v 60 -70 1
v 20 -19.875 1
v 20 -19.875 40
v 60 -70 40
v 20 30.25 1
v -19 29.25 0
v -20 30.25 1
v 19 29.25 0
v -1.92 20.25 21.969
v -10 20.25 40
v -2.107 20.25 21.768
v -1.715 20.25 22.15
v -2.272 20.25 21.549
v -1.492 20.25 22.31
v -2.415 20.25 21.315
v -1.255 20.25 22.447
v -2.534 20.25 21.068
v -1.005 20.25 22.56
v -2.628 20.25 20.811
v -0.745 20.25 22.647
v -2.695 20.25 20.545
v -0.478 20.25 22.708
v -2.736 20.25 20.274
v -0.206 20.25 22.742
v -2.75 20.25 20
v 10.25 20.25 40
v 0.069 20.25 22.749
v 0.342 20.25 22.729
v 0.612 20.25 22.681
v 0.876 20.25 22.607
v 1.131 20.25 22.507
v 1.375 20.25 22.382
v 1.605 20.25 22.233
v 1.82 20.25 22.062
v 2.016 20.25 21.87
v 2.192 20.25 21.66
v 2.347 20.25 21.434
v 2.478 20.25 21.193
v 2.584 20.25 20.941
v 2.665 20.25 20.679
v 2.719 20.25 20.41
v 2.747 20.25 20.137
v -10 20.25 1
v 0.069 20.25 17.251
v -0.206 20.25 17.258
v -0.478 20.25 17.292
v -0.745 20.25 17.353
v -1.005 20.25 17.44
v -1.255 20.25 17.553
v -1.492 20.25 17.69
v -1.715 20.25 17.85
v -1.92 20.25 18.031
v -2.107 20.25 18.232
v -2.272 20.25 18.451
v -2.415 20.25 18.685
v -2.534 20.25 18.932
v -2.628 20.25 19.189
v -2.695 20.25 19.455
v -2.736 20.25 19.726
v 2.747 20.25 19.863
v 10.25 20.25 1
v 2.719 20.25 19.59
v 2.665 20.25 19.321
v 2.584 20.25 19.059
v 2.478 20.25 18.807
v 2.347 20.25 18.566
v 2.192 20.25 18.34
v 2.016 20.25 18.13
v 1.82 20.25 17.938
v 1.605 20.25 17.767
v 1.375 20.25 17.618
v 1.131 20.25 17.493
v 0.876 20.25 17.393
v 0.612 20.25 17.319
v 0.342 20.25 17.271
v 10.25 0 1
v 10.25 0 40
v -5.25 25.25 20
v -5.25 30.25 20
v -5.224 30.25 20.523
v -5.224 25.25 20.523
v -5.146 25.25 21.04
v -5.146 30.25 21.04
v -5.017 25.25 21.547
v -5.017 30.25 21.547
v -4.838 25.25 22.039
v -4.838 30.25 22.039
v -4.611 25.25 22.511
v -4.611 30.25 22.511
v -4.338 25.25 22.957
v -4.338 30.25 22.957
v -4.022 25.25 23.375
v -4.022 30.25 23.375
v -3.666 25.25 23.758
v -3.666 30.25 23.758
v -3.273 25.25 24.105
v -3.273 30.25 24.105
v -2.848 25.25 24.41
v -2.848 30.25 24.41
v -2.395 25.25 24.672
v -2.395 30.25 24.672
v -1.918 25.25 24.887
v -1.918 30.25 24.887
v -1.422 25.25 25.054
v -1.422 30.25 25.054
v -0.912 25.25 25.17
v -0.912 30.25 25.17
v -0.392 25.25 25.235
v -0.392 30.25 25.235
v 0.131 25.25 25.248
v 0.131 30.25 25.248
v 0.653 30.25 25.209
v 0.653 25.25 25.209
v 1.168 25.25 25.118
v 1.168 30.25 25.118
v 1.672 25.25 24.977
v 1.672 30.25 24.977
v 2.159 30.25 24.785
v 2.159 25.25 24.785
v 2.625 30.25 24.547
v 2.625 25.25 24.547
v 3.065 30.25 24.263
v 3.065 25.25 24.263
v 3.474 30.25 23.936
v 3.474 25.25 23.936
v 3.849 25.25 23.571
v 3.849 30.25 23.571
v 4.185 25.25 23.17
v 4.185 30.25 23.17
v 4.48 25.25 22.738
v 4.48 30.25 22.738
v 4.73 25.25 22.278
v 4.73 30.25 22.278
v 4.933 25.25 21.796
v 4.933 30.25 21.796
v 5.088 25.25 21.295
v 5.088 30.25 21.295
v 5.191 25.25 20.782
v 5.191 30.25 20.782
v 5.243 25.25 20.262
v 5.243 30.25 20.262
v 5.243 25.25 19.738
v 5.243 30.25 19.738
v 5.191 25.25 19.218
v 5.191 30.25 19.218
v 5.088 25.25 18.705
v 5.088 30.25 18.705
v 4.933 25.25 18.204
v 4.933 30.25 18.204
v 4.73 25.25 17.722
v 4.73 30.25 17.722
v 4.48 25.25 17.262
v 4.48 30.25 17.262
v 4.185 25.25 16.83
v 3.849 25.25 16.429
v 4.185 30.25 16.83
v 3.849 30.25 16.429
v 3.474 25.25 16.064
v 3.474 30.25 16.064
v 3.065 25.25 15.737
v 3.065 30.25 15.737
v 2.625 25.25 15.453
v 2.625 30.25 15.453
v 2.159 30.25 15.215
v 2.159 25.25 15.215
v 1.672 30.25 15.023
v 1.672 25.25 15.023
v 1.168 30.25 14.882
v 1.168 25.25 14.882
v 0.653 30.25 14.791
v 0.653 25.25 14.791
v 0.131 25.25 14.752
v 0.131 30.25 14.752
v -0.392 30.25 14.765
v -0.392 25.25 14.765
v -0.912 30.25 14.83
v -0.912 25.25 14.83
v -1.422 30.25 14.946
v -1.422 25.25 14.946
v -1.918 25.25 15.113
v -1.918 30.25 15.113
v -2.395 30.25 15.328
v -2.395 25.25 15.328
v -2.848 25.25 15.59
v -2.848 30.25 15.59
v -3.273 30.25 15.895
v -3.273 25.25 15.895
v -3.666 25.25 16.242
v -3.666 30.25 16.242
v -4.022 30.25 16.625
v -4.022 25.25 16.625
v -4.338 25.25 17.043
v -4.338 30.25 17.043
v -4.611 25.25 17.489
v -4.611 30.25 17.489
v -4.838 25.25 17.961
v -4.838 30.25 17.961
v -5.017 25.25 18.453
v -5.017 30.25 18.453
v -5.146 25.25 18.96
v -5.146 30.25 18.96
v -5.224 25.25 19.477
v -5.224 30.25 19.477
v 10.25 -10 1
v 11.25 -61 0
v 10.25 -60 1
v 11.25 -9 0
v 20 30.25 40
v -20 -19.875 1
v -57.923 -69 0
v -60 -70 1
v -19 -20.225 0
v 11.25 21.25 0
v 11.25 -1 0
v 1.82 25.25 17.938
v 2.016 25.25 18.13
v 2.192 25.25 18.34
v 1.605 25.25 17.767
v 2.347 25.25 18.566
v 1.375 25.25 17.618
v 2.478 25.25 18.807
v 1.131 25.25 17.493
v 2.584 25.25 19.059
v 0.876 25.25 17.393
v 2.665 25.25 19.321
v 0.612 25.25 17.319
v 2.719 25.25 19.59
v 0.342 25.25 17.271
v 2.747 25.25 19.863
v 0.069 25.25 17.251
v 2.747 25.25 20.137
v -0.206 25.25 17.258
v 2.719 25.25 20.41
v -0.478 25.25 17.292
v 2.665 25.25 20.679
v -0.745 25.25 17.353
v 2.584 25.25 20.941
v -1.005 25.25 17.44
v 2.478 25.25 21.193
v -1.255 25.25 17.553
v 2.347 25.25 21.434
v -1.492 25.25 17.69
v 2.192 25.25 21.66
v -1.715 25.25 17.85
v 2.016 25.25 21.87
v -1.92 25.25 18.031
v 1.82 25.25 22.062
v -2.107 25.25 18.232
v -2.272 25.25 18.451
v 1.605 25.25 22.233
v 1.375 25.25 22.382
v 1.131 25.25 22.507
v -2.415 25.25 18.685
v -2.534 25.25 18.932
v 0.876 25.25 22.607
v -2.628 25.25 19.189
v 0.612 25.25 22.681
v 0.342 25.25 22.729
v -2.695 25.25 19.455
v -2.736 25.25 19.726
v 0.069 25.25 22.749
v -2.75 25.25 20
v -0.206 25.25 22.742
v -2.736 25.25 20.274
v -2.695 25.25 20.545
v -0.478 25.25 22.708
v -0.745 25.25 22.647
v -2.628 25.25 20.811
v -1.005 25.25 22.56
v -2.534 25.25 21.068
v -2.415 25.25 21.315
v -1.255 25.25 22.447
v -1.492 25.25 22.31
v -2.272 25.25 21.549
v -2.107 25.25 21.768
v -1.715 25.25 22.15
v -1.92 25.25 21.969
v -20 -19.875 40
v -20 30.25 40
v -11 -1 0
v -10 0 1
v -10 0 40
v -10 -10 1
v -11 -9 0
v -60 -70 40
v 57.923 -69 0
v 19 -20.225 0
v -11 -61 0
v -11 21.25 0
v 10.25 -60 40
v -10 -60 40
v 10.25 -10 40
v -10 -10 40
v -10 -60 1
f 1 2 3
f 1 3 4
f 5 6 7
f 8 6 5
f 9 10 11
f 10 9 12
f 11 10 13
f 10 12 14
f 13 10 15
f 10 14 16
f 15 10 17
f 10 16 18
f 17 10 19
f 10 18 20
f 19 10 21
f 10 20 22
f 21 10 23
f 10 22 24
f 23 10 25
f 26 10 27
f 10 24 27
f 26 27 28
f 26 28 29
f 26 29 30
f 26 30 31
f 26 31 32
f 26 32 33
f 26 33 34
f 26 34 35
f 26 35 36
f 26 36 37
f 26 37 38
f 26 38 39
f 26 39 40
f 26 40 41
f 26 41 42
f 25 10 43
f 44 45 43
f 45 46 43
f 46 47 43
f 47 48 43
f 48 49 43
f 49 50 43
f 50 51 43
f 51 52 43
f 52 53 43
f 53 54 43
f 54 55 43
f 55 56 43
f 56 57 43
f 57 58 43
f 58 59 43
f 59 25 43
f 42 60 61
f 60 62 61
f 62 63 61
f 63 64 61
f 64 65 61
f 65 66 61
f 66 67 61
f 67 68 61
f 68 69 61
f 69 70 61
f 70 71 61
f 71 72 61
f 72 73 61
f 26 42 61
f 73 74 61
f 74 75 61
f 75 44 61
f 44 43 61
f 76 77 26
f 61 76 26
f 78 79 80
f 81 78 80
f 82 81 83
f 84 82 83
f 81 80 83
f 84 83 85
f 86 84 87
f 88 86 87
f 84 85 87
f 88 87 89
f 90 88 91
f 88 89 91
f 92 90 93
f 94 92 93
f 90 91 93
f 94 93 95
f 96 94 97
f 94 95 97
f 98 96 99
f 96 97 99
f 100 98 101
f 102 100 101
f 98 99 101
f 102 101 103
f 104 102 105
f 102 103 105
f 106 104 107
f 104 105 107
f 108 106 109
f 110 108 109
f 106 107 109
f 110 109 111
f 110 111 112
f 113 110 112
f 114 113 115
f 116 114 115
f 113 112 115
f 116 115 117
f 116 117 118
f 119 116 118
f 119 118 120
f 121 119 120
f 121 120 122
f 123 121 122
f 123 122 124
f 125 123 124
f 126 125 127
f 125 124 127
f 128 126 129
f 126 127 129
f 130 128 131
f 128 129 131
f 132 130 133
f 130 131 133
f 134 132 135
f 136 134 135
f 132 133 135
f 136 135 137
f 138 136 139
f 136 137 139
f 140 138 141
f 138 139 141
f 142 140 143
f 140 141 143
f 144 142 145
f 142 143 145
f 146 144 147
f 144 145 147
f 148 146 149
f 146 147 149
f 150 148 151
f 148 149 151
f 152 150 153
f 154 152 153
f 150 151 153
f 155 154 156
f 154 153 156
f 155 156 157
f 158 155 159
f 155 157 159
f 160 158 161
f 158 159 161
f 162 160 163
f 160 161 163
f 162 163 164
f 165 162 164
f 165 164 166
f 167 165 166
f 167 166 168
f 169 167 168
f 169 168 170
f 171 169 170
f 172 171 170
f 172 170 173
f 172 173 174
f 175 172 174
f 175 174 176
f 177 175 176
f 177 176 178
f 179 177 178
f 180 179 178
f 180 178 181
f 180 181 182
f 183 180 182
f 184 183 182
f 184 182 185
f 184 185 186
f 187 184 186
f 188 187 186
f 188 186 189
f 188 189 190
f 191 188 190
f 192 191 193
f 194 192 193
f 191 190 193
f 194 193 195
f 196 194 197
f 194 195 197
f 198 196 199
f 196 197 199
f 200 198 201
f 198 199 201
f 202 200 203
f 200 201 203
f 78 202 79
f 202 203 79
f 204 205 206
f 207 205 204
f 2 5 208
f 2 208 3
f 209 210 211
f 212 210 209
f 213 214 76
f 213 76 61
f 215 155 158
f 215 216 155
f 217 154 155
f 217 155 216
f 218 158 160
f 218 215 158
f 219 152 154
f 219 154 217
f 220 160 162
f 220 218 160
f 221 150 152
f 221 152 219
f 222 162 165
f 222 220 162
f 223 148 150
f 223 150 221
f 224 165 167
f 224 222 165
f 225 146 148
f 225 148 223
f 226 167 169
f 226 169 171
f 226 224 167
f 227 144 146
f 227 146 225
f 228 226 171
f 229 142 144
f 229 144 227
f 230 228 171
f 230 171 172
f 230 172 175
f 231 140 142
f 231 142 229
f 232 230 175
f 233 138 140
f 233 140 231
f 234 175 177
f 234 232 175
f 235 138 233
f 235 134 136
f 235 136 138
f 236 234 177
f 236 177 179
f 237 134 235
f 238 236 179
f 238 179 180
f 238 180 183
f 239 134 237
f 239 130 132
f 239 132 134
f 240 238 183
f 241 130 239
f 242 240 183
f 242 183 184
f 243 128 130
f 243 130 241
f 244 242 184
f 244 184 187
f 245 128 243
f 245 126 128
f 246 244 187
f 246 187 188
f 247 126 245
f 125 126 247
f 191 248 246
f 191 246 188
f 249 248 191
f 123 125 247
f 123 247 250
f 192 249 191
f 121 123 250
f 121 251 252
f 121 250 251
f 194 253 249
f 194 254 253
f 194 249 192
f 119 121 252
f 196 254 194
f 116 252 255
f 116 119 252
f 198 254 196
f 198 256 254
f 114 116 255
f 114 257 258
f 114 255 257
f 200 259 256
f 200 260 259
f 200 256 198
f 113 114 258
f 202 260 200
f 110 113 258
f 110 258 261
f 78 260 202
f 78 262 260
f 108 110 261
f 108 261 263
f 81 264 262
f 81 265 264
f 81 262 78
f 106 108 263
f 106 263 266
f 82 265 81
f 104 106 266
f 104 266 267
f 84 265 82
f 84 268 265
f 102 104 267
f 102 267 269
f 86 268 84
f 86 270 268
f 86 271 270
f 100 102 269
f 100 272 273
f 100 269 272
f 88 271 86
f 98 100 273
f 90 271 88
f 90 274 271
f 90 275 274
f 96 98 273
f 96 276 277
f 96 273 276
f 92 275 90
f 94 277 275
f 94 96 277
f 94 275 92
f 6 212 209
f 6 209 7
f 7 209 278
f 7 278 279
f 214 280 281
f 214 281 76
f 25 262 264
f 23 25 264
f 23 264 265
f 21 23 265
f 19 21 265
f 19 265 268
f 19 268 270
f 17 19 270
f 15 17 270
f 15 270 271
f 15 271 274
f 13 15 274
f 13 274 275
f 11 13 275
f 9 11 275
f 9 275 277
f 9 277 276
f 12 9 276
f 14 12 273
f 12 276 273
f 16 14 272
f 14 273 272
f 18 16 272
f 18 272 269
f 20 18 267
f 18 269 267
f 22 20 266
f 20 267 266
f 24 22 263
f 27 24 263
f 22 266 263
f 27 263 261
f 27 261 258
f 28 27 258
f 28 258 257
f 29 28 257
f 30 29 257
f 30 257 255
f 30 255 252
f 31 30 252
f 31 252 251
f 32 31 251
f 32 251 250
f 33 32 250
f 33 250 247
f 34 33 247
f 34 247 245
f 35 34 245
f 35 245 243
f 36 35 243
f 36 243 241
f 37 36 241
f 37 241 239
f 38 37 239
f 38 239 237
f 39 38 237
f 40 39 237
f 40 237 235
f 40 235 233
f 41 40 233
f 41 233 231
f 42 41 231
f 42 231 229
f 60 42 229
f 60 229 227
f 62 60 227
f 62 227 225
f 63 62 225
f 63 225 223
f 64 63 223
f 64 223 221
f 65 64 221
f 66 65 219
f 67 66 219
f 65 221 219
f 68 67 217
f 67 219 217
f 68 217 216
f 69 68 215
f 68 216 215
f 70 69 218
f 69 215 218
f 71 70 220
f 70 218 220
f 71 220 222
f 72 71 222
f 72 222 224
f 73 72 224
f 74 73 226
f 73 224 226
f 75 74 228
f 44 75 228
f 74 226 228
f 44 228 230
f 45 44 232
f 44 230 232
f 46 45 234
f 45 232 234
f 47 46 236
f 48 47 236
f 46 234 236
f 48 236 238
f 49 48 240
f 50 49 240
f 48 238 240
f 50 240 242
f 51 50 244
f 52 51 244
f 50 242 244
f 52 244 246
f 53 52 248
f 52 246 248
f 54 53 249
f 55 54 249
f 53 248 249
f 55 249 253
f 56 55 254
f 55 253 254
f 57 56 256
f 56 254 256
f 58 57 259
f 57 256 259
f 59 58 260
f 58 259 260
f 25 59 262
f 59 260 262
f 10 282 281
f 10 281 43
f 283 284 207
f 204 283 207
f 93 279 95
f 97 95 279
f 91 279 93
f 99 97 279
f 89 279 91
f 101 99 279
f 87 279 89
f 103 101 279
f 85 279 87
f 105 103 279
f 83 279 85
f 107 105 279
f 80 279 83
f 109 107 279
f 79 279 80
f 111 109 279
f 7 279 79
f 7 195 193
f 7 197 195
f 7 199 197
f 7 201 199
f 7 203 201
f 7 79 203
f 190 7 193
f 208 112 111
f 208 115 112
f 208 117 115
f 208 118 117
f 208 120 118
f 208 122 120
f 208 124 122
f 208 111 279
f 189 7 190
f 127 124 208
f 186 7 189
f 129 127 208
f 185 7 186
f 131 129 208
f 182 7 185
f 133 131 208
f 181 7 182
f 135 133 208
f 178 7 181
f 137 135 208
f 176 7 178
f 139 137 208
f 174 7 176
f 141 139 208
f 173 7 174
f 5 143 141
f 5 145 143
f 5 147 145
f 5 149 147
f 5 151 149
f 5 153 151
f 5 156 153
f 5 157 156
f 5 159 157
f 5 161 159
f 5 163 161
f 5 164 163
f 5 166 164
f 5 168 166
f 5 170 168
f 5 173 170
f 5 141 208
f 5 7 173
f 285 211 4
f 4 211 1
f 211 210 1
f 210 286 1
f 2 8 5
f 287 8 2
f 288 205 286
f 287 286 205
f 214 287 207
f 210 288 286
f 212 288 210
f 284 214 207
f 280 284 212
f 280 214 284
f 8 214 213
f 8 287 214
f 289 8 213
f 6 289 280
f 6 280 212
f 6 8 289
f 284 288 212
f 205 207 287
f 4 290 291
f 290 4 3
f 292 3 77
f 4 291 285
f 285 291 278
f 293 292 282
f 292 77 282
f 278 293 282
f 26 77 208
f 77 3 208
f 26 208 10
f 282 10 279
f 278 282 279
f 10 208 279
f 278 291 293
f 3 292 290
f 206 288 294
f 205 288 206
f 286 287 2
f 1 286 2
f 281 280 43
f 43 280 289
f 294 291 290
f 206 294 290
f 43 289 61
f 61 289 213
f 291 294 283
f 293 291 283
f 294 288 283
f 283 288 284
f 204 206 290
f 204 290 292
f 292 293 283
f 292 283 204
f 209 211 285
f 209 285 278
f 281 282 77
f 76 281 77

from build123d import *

# Parameters (mm, degrees)
SKETCH1_W           = 20.25
SKETCH1_H           = 20.25
SKETCH1_H_2         = 50
BOSS_EXTRUDE1_DEPTH = 40
CHAMFER1_SIZE       = 1
SKETCH2_R           = 2.75
CUT_EXTRUDE1_DEPTH  = 20
SKETCH3_R           = 5.25
CUT_EXTRUDE2_DEPTH  = 5


with BuildPart() as part:
    # Sketch1 → Boss-Extrude1 (new body)
    with BuildSketch(Plane.XY):
        Polygon((20, -19.875), (60, -70), (20, -70), (-20, -70), (-60, -70), (-20, -19.875), (-20, 30.25), (20, 30.25), align=None)
        with Locations((0.125, 10.125)):
            Rectangle(SKETCH1_W, SKETCH1_H, mode=Mode.SUBTRACT)
        with Locations((0.125, -35)):
            Rectangle(SKETCH1_W, SKETCH1_H_2, mode=Mode.SUBTRACT)
    extrude(amount=BOSS_EXTRUDE1_DEPTH)

    # Chamfer1
    chamfer1_edges = [part.edges().sort_by_distance(p)[0] for p in [
        (-40, -44.9375, 0),
        (-20, 5.1875, 0),
        (-10, 10.125, 0),
        (0.125, 0, 0),
        (10.25, 10.125, 0),
        (0.125, 20.25, 0),
        (-10, -35, 0),
        (0.125, -60, 0),
        (10.25, -35, 0),
        (0.125, -10, 0),
        (0, 30.25, 0),
        (20, 5.1875, 0),
        (40, -44.9375, 0),
        (0, -70, 0),
    ]]
    chamfer(chamfer1_edges, length=CHAMFER1_SIZE)

    # Sketch2 → Cut-Extrude1 (cut)
    with BuildSketch(Plane(origin=(0, 30.25, 0), x_dir=(1, 0, 0), z_dir=(0, 1, 0))):
        with Locations(Location((0, -20, 0), (0, 0, 180))):
            Circle(SKETCH2_R)
    extrude(amount=-CUT_EXTRUDE1_DEPTH, mode=Mode.SUBTRACT)

    # Sketch3 → Cut-Extrude2 (cut)
    with BuildSketch(Plane(origin=(0, 30.25, 0), x_dir=(1, 0, 0), z_dir=(0, 1, 0))):
        with Locations(Location((0, -20, 0), (0, 0, 180))):
            Circle(SKETCH3_R)
    extrude(amount=-CUT_EXTRUDE2_DEPTH, mode=Mode.SUBTRACT)


solid = part.part
